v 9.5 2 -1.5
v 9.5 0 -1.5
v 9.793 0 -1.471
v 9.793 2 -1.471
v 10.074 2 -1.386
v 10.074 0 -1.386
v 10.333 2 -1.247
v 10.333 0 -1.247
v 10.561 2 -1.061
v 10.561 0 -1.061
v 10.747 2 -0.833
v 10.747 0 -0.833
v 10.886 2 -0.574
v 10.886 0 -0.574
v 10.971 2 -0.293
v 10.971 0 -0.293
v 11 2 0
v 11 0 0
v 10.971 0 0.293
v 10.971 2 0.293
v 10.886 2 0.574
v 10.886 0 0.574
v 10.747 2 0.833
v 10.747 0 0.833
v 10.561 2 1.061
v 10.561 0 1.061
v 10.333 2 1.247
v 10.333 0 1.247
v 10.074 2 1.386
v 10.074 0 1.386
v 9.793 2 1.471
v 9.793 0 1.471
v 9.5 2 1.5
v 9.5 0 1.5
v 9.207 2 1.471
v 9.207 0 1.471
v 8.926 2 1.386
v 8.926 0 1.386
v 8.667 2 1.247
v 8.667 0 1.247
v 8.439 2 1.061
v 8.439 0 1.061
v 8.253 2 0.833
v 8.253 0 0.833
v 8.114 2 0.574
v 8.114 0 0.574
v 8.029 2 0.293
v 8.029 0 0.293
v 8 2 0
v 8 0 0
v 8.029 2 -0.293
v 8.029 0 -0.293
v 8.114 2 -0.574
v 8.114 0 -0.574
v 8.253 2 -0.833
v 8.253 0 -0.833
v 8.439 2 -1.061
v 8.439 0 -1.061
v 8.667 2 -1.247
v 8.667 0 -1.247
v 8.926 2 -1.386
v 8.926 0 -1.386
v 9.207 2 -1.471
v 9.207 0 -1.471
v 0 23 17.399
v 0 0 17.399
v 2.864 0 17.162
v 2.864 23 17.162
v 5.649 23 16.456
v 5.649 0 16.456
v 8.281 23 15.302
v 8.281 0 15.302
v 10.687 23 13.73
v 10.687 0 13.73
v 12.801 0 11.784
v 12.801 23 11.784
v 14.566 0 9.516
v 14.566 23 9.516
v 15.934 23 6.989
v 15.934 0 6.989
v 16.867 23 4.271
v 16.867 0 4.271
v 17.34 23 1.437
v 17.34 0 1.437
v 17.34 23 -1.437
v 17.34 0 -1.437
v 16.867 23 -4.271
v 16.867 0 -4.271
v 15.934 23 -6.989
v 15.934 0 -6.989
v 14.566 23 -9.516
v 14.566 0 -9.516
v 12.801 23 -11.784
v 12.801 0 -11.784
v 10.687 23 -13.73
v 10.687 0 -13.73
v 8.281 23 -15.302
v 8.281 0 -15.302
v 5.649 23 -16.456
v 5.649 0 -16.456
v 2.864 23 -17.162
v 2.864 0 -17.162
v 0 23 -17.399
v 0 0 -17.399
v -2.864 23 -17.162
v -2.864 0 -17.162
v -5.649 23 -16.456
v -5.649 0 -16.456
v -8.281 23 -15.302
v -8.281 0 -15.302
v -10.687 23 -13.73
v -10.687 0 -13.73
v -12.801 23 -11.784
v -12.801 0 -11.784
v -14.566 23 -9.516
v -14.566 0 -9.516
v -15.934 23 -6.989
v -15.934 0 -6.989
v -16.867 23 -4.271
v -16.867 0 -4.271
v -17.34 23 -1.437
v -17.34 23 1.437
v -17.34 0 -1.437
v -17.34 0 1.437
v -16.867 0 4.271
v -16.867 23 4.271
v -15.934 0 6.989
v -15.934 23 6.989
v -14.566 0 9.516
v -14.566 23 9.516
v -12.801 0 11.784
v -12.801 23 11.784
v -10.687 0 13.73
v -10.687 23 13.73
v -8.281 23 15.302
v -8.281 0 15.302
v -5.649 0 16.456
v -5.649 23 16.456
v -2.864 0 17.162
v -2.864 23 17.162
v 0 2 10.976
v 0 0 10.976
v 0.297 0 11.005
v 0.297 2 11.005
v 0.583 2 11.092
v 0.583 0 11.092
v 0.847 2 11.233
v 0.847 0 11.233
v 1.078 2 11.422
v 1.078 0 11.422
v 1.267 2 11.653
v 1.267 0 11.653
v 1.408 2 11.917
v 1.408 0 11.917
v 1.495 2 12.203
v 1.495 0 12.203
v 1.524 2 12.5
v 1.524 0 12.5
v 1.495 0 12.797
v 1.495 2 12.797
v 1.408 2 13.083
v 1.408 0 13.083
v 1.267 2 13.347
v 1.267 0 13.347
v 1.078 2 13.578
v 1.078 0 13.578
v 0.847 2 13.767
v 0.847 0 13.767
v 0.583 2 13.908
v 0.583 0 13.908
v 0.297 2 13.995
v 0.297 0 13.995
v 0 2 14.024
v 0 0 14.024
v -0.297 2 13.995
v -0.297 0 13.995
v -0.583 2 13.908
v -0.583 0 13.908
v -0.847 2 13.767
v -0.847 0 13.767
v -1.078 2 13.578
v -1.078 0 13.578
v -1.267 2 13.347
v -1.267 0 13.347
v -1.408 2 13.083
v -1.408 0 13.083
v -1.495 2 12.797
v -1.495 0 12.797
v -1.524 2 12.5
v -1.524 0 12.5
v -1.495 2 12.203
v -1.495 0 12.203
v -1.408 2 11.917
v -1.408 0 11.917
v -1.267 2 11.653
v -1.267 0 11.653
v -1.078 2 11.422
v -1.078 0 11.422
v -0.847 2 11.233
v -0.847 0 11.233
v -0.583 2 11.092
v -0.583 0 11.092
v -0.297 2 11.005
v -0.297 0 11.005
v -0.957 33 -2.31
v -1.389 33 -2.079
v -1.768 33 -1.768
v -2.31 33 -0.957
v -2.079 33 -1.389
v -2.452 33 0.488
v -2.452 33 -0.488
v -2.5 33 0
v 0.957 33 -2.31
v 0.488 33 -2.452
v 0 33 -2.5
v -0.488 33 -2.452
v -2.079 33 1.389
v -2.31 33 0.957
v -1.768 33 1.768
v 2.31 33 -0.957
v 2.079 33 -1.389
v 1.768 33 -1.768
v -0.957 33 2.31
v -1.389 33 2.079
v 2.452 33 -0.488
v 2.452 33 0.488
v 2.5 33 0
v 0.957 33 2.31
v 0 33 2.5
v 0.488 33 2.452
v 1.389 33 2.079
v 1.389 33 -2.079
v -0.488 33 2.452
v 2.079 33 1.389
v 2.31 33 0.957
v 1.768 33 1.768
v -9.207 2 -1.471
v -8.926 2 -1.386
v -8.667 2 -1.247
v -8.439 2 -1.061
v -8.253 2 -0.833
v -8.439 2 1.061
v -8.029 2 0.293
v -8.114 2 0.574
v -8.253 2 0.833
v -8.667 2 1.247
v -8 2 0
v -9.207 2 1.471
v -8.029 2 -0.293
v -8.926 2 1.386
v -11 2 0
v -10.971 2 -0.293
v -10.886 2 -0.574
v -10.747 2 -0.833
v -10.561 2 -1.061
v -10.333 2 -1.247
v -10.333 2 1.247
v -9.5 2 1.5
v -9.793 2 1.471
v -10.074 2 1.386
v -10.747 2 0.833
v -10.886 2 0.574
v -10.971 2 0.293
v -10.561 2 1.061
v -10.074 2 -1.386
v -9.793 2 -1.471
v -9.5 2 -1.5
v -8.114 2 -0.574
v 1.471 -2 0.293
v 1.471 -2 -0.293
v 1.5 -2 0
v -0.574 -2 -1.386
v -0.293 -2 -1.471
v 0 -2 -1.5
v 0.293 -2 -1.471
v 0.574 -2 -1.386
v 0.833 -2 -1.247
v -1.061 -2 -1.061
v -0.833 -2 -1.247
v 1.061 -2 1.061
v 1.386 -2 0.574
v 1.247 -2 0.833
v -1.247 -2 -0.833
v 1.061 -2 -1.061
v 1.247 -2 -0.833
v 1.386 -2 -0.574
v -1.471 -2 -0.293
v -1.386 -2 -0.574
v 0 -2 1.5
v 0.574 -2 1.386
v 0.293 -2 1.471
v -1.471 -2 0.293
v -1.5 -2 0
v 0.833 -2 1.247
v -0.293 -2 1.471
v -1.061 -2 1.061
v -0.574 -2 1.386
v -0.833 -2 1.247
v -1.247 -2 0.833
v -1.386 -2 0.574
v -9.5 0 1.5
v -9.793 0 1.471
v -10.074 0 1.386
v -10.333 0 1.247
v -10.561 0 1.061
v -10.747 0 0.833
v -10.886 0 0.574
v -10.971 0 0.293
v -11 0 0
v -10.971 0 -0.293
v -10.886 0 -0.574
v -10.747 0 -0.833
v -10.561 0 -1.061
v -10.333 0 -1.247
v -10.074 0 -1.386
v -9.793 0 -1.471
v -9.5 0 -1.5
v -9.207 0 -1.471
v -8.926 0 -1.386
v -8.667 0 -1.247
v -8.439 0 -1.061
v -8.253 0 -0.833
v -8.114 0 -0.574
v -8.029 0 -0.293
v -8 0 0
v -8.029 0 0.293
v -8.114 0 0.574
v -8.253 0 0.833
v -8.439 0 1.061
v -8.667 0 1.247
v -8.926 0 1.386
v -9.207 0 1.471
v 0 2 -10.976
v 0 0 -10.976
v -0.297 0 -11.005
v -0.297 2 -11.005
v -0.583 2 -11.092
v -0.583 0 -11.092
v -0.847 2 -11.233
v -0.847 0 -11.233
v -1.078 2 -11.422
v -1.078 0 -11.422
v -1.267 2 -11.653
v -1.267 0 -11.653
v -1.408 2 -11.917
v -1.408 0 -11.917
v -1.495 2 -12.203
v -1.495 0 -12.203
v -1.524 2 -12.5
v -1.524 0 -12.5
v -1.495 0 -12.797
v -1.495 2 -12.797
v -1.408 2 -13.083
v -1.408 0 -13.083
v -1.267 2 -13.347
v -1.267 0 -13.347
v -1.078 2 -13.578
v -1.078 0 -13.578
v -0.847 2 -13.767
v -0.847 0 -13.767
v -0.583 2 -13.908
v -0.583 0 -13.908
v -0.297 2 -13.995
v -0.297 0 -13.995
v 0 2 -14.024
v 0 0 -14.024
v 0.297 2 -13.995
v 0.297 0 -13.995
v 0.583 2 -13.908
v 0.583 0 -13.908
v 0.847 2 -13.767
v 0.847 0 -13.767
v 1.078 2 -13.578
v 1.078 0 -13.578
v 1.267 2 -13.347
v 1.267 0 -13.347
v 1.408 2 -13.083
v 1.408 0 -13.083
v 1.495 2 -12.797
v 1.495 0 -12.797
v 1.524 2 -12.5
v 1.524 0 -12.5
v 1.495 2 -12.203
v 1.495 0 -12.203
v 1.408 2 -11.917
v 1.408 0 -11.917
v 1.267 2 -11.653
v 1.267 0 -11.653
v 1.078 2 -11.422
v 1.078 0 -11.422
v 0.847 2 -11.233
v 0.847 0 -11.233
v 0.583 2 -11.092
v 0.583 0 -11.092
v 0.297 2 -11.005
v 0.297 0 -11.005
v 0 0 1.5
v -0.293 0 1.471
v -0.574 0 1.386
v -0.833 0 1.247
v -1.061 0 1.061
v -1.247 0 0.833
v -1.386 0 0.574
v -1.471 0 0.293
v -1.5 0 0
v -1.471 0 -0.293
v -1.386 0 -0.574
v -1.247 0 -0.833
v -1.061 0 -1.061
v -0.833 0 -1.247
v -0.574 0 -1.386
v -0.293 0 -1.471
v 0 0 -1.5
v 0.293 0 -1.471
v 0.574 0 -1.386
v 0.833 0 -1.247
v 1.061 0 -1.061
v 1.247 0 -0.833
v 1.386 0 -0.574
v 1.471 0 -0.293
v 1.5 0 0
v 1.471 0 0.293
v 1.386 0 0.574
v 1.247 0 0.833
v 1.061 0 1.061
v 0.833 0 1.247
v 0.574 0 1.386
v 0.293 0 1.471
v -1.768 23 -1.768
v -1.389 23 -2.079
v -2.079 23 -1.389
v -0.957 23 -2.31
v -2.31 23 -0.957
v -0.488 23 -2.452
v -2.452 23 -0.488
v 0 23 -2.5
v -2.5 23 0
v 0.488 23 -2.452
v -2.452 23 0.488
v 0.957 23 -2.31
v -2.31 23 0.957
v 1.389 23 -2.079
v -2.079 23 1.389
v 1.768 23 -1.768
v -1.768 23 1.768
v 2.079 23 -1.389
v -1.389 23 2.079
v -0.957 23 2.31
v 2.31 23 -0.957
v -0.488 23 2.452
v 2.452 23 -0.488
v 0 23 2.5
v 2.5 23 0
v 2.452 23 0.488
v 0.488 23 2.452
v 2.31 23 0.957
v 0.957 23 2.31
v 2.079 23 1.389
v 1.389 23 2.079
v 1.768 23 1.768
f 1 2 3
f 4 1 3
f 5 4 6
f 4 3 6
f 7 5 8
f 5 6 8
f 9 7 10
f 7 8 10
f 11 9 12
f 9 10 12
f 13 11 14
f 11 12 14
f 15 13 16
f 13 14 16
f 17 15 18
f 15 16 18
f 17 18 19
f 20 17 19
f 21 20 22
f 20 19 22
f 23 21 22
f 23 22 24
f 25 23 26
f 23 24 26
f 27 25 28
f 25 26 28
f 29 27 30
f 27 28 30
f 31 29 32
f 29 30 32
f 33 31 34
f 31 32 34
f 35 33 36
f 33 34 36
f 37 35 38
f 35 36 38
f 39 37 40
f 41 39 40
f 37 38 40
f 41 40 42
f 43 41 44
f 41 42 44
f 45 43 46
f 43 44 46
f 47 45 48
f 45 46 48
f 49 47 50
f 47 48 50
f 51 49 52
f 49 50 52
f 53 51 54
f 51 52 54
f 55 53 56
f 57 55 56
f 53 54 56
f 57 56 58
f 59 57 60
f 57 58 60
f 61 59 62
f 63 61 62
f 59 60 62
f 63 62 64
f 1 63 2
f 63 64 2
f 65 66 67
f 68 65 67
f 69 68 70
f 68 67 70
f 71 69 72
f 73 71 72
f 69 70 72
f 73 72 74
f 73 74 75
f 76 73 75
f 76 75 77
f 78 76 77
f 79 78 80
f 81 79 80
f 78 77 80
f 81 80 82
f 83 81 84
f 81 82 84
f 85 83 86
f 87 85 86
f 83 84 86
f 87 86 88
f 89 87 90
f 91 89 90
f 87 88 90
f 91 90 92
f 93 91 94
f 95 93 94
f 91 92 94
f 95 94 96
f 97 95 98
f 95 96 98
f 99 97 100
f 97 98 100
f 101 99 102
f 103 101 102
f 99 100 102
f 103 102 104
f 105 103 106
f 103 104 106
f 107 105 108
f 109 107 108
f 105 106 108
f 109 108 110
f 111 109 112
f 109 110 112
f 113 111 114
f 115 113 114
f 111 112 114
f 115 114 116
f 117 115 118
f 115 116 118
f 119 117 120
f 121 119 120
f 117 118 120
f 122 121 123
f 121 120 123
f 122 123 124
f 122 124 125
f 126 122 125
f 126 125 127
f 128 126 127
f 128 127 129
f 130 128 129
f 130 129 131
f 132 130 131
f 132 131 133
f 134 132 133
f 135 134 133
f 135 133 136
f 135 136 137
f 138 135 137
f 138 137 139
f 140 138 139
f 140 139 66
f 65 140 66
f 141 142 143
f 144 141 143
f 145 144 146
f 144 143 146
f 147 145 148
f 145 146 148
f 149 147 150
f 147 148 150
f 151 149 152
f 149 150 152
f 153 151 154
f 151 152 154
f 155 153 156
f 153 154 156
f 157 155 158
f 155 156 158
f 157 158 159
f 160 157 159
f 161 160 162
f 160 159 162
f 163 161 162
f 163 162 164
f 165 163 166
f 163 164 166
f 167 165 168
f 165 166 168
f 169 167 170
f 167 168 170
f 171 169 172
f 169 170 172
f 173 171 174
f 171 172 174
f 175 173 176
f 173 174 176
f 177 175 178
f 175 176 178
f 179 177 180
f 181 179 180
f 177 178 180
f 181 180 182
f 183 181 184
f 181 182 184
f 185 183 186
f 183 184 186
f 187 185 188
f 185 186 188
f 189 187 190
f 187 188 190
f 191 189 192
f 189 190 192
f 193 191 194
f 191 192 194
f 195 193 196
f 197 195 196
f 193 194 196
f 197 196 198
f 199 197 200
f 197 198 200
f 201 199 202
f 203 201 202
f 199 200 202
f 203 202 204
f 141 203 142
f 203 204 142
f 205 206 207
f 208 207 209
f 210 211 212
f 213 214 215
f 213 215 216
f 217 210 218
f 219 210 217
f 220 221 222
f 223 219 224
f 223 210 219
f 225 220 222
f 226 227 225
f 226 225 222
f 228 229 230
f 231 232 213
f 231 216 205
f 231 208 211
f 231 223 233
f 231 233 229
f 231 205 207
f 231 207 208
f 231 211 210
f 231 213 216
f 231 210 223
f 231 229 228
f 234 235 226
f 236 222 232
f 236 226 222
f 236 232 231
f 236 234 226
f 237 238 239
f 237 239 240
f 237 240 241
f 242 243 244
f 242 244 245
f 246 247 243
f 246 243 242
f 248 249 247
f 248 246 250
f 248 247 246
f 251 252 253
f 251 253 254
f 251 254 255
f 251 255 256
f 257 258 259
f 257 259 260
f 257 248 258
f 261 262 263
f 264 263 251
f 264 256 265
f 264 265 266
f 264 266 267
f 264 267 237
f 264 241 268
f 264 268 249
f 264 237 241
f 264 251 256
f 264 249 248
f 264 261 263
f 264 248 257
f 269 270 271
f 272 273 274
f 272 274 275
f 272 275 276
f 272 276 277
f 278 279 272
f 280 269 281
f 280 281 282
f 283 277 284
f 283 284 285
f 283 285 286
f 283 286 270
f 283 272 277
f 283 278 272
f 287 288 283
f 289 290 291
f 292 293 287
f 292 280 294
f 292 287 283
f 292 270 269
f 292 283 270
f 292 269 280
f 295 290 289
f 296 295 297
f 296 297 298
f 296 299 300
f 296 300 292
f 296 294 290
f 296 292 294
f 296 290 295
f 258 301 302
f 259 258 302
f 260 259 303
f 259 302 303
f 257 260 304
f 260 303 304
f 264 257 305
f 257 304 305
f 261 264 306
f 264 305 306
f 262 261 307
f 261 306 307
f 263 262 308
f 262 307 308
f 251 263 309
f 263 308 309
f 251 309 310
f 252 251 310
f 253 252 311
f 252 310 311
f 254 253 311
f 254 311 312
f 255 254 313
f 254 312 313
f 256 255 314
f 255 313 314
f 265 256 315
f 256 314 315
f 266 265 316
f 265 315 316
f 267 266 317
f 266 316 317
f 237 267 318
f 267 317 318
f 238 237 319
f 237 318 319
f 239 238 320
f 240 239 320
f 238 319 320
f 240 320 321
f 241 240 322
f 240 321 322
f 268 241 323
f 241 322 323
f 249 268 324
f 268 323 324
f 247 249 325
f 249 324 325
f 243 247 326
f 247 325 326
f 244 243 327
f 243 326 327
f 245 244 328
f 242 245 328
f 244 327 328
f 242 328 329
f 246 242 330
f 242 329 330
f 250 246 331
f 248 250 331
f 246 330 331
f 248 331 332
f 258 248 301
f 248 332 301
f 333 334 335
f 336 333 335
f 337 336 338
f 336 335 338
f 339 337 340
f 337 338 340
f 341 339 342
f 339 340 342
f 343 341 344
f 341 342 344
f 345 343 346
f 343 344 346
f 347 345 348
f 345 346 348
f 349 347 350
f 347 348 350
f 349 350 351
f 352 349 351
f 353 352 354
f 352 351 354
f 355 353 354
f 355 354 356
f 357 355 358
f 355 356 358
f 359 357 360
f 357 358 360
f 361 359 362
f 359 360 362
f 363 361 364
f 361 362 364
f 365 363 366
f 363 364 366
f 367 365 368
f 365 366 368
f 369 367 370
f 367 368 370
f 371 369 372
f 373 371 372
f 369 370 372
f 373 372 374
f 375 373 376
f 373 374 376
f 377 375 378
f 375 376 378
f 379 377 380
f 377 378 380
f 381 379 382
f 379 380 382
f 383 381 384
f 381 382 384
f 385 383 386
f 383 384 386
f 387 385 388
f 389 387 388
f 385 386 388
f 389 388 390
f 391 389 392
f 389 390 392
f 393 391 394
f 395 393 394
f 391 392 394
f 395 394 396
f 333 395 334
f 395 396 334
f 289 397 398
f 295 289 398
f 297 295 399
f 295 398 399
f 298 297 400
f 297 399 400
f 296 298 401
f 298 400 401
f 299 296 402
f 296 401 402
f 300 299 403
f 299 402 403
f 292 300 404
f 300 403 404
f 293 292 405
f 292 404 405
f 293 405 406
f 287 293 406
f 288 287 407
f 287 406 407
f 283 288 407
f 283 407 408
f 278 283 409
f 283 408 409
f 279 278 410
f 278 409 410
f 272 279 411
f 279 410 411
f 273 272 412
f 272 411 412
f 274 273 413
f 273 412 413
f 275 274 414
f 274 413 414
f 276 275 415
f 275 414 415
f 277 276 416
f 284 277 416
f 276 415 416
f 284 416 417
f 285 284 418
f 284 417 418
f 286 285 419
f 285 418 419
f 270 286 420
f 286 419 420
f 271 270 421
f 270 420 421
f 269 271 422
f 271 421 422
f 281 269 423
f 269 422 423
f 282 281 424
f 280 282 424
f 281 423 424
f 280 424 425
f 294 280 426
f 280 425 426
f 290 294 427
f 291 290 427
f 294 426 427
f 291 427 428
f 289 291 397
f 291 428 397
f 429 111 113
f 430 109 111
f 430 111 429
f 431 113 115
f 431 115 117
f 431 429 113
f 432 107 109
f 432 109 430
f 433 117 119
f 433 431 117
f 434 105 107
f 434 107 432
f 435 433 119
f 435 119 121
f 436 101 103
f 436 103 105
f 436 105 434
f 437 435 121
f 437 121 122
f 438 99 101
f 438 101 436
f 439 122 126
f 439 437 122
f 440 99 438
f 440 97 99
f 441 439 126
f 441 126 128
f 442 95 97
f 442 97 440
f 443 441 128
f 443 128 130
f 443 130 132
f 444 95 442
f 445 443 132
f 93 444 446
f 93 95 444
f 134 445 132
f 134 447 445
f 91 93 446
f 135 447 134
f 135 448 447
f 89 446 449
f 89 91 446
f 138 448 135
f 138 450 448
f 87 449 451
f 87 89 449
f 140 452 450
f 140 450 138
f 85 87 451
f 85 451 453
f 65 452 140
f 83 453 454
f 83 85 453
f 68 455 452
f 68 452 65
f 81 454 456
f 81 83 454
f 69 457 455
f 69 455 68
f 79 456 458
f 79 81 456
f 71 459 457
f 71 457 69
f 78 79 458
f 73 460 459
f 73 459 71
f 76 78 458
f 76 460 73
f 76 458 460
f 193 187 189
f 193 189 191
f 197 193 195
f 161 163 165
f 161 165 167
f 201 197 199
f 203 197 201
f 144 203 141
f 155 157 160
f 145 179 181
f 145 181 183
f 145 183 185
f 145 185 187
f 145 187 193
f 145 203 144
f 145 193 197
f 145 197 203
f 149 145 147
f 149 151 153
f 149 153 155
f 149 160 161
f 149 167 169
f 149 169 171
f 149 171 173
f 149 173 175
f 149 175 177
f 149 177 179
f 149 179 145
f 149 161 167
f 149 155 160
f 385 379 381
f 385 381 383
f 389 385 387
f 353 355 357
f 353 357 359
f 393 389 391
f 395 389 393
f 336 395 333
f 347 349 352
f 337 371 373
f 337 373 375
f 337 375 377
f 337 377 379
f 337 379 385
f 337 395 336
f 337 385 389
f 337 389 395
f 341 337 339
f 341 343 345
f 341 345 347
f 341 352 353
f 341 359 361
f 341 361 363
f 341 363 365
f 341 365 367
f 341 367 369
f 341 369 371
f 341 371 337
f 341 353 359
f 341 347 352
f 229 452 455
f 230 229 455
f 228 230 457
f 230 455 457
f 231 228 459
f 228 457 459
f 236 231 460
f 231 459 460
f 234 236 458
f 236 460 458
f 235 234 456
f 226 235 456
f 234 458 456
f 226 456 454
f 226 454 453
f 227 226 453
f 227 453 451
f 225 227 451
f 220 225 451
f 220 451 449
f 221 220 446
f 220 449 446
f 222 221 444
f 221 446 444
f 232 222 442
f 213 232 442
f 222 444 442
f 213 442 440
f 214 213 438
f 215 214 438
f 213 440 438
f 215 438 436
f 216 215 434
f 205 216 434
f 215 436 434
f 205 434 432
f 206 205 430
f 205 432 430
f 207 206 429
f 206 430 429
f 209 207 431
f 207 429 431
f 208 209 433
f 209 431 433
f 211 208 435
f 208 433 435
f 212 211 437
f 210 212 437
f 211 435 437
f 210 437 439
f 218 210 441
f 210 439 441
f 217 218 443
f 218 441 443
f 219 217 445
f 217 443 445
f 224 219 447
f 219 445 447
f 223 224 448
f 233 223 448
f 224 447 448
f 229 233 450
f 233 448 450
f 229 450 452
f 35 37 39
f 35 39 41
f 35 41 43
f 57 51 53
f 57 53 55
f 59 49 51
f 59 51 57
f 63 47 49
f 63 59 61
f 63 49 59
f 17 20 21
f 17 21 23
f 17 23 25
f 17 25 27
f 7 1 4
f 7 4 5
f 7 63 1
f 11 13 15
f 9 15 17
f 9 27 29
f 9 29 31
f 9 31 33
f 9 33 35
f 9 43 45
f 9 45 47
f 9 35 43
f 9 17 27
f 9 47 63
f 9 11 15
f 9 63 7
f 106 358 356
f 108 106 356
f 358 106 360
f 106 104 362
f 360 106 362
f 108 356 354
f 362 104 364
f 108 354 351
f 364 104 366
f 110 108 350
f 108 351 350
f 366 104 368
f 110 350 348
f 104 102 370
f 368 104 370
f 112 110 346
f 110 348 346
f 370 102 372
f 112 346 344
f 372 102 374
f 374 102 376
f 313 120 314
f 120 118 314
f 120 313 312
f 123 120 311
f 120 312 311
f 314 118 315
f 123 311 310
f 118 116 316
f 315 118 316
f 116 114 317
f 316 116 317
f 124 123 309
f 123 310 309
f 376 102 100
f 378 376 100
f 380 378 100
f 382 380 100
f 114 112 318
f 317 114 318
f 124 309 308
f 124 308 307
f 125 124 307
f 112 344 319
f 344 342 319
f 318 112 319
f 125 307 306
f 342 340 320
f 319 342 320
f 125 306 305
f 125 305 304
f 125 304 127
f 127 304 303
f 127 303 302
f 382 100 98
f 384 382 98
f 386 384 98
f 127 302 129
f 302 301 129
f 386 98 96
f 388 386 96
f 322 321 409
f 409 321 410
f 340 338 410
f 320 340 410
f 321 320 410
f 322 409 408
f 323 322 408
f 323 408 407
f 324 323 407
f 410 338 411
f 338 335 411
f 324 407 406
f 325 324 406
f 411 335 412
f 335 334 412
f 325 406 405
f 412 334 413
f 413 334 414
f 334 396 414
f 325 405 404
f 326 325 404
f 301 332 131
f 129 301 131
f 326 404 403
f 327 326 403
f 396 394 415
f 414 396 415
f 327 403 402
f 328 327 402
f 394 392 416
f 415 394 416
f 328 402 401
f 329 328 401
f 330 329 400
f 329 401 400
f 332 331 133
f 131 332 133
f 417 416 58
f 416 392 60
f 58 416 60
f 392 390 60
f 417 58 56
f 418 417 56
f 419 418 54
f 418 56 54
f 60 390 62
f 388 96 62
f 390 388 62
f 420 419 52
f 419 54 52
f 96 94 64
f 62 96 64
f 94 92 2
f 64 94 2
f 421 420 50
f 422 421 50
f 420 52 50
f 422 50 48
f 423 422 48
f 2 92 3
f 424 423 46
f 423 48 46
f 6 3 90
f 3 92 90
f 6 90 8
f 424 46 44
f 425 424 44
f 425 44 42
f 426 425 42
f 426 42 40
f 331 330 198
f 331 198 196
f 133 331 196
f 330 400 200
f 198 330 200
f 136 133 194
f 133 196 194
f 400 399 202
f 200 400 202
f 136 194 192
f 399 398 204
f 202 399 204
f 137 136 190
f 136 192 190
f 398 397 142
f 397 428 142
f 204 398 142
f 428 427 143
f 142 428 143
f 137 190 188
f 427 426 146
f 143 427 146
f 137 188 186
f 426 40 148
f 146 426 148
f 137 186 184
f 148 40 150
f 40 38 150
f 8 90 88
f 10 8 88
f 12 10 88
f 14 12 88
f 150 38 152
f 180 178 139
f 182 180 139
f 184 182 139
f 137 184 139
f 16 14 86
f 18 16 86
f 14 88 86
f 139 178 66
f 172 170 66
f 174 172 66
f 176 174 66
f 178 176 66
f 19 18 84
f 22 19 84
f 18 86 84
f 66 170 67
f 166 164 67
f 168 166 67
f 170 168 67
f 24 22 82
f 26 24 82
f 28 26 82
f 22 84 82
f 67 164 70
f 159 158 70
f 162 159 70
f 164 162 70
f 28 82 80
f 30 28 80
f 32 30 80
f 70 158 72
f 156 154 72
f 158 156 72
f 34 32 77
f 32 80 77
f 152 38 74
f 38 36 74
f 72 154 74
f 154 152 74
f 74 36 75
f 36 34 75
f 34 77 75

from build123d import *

# Parameters (mm, degrees)
SKETCH1_R           = 17.399
BOSS_EXTRUDE1_DEPTH = 23.0000048
SKETCH2_R           = 2.5
BOSS_EXTRUDE2_DEPTH = 10
SKETCH3_R           = 1.499997
BOSS_EXTRUDE3_DEPTH = 2
SKETCH4_R           = 1.524
SKETCH4_R_2         = 1.5
CUT_EXTRUDE1_DEPTH  = 2


with BuildPart() as part:
    # Sketch1 → Boss-Extrude1 (new body)
    with BuildSketch(Plane(origin=(0, 0, 0), x_dir=(1, 0, 0), z_dir=(0, 1, 0))):
        with Locations(Location((0, 0, 0), (0, 0, 270))):
            Circle(SKETCH1_R)
    extrude(amount=BOSS_EXTRUDE1_DEPTH)

    # Sketch2 → Boss-Extrude2 (add)
    with BuildSketch(Plane(origin=(0, 23.0000048, 0), x_dir=(1, 0, 0), z_dir=(0, 1, 0))):
        with Locations(Location((0, 0, 0), (0, 0, 270))):
            Circle(SKETCH2_R)
    extrude(amount=BOSS_EXTRUDE2_DEPTH)

    # Sketch3 → Boss-Extrude3 (add)
    with BuildSketch(Plane.XZ):
        with Locations(Location((0, 0, 0), (0, 0, 90))):
            Circle(SKETCH3_R)
    extrude(amount=BOSS_EXTRUDE3_DEPTH)

    # Sketch4 → Cut-Extrude1 (cut)
    with BuildSketch(Plane.XZ):
        with Locations(Location((0, 12.5000004, 0), (0, 0, 270))):
            Circle(SKETCH4_R)
        with Locations(Location((9.4999937, 0, 0), (0, 0, 270))):
            Circle(SKETCH4_R_2)
        with Locations(Location((-9.4999937, 0, 0), (0, 0, 90))):
            Circle(SKETCH4_R_2)
        with Locations(Location((0, -12.5000004, 0), (0, 0, 90))):
            Circle(SKETCH4_R)
    extrude(amount=-CUT_EXTRUDE1_DEPTH, mode=Mode.SUBTRACT)


solid = part.part
